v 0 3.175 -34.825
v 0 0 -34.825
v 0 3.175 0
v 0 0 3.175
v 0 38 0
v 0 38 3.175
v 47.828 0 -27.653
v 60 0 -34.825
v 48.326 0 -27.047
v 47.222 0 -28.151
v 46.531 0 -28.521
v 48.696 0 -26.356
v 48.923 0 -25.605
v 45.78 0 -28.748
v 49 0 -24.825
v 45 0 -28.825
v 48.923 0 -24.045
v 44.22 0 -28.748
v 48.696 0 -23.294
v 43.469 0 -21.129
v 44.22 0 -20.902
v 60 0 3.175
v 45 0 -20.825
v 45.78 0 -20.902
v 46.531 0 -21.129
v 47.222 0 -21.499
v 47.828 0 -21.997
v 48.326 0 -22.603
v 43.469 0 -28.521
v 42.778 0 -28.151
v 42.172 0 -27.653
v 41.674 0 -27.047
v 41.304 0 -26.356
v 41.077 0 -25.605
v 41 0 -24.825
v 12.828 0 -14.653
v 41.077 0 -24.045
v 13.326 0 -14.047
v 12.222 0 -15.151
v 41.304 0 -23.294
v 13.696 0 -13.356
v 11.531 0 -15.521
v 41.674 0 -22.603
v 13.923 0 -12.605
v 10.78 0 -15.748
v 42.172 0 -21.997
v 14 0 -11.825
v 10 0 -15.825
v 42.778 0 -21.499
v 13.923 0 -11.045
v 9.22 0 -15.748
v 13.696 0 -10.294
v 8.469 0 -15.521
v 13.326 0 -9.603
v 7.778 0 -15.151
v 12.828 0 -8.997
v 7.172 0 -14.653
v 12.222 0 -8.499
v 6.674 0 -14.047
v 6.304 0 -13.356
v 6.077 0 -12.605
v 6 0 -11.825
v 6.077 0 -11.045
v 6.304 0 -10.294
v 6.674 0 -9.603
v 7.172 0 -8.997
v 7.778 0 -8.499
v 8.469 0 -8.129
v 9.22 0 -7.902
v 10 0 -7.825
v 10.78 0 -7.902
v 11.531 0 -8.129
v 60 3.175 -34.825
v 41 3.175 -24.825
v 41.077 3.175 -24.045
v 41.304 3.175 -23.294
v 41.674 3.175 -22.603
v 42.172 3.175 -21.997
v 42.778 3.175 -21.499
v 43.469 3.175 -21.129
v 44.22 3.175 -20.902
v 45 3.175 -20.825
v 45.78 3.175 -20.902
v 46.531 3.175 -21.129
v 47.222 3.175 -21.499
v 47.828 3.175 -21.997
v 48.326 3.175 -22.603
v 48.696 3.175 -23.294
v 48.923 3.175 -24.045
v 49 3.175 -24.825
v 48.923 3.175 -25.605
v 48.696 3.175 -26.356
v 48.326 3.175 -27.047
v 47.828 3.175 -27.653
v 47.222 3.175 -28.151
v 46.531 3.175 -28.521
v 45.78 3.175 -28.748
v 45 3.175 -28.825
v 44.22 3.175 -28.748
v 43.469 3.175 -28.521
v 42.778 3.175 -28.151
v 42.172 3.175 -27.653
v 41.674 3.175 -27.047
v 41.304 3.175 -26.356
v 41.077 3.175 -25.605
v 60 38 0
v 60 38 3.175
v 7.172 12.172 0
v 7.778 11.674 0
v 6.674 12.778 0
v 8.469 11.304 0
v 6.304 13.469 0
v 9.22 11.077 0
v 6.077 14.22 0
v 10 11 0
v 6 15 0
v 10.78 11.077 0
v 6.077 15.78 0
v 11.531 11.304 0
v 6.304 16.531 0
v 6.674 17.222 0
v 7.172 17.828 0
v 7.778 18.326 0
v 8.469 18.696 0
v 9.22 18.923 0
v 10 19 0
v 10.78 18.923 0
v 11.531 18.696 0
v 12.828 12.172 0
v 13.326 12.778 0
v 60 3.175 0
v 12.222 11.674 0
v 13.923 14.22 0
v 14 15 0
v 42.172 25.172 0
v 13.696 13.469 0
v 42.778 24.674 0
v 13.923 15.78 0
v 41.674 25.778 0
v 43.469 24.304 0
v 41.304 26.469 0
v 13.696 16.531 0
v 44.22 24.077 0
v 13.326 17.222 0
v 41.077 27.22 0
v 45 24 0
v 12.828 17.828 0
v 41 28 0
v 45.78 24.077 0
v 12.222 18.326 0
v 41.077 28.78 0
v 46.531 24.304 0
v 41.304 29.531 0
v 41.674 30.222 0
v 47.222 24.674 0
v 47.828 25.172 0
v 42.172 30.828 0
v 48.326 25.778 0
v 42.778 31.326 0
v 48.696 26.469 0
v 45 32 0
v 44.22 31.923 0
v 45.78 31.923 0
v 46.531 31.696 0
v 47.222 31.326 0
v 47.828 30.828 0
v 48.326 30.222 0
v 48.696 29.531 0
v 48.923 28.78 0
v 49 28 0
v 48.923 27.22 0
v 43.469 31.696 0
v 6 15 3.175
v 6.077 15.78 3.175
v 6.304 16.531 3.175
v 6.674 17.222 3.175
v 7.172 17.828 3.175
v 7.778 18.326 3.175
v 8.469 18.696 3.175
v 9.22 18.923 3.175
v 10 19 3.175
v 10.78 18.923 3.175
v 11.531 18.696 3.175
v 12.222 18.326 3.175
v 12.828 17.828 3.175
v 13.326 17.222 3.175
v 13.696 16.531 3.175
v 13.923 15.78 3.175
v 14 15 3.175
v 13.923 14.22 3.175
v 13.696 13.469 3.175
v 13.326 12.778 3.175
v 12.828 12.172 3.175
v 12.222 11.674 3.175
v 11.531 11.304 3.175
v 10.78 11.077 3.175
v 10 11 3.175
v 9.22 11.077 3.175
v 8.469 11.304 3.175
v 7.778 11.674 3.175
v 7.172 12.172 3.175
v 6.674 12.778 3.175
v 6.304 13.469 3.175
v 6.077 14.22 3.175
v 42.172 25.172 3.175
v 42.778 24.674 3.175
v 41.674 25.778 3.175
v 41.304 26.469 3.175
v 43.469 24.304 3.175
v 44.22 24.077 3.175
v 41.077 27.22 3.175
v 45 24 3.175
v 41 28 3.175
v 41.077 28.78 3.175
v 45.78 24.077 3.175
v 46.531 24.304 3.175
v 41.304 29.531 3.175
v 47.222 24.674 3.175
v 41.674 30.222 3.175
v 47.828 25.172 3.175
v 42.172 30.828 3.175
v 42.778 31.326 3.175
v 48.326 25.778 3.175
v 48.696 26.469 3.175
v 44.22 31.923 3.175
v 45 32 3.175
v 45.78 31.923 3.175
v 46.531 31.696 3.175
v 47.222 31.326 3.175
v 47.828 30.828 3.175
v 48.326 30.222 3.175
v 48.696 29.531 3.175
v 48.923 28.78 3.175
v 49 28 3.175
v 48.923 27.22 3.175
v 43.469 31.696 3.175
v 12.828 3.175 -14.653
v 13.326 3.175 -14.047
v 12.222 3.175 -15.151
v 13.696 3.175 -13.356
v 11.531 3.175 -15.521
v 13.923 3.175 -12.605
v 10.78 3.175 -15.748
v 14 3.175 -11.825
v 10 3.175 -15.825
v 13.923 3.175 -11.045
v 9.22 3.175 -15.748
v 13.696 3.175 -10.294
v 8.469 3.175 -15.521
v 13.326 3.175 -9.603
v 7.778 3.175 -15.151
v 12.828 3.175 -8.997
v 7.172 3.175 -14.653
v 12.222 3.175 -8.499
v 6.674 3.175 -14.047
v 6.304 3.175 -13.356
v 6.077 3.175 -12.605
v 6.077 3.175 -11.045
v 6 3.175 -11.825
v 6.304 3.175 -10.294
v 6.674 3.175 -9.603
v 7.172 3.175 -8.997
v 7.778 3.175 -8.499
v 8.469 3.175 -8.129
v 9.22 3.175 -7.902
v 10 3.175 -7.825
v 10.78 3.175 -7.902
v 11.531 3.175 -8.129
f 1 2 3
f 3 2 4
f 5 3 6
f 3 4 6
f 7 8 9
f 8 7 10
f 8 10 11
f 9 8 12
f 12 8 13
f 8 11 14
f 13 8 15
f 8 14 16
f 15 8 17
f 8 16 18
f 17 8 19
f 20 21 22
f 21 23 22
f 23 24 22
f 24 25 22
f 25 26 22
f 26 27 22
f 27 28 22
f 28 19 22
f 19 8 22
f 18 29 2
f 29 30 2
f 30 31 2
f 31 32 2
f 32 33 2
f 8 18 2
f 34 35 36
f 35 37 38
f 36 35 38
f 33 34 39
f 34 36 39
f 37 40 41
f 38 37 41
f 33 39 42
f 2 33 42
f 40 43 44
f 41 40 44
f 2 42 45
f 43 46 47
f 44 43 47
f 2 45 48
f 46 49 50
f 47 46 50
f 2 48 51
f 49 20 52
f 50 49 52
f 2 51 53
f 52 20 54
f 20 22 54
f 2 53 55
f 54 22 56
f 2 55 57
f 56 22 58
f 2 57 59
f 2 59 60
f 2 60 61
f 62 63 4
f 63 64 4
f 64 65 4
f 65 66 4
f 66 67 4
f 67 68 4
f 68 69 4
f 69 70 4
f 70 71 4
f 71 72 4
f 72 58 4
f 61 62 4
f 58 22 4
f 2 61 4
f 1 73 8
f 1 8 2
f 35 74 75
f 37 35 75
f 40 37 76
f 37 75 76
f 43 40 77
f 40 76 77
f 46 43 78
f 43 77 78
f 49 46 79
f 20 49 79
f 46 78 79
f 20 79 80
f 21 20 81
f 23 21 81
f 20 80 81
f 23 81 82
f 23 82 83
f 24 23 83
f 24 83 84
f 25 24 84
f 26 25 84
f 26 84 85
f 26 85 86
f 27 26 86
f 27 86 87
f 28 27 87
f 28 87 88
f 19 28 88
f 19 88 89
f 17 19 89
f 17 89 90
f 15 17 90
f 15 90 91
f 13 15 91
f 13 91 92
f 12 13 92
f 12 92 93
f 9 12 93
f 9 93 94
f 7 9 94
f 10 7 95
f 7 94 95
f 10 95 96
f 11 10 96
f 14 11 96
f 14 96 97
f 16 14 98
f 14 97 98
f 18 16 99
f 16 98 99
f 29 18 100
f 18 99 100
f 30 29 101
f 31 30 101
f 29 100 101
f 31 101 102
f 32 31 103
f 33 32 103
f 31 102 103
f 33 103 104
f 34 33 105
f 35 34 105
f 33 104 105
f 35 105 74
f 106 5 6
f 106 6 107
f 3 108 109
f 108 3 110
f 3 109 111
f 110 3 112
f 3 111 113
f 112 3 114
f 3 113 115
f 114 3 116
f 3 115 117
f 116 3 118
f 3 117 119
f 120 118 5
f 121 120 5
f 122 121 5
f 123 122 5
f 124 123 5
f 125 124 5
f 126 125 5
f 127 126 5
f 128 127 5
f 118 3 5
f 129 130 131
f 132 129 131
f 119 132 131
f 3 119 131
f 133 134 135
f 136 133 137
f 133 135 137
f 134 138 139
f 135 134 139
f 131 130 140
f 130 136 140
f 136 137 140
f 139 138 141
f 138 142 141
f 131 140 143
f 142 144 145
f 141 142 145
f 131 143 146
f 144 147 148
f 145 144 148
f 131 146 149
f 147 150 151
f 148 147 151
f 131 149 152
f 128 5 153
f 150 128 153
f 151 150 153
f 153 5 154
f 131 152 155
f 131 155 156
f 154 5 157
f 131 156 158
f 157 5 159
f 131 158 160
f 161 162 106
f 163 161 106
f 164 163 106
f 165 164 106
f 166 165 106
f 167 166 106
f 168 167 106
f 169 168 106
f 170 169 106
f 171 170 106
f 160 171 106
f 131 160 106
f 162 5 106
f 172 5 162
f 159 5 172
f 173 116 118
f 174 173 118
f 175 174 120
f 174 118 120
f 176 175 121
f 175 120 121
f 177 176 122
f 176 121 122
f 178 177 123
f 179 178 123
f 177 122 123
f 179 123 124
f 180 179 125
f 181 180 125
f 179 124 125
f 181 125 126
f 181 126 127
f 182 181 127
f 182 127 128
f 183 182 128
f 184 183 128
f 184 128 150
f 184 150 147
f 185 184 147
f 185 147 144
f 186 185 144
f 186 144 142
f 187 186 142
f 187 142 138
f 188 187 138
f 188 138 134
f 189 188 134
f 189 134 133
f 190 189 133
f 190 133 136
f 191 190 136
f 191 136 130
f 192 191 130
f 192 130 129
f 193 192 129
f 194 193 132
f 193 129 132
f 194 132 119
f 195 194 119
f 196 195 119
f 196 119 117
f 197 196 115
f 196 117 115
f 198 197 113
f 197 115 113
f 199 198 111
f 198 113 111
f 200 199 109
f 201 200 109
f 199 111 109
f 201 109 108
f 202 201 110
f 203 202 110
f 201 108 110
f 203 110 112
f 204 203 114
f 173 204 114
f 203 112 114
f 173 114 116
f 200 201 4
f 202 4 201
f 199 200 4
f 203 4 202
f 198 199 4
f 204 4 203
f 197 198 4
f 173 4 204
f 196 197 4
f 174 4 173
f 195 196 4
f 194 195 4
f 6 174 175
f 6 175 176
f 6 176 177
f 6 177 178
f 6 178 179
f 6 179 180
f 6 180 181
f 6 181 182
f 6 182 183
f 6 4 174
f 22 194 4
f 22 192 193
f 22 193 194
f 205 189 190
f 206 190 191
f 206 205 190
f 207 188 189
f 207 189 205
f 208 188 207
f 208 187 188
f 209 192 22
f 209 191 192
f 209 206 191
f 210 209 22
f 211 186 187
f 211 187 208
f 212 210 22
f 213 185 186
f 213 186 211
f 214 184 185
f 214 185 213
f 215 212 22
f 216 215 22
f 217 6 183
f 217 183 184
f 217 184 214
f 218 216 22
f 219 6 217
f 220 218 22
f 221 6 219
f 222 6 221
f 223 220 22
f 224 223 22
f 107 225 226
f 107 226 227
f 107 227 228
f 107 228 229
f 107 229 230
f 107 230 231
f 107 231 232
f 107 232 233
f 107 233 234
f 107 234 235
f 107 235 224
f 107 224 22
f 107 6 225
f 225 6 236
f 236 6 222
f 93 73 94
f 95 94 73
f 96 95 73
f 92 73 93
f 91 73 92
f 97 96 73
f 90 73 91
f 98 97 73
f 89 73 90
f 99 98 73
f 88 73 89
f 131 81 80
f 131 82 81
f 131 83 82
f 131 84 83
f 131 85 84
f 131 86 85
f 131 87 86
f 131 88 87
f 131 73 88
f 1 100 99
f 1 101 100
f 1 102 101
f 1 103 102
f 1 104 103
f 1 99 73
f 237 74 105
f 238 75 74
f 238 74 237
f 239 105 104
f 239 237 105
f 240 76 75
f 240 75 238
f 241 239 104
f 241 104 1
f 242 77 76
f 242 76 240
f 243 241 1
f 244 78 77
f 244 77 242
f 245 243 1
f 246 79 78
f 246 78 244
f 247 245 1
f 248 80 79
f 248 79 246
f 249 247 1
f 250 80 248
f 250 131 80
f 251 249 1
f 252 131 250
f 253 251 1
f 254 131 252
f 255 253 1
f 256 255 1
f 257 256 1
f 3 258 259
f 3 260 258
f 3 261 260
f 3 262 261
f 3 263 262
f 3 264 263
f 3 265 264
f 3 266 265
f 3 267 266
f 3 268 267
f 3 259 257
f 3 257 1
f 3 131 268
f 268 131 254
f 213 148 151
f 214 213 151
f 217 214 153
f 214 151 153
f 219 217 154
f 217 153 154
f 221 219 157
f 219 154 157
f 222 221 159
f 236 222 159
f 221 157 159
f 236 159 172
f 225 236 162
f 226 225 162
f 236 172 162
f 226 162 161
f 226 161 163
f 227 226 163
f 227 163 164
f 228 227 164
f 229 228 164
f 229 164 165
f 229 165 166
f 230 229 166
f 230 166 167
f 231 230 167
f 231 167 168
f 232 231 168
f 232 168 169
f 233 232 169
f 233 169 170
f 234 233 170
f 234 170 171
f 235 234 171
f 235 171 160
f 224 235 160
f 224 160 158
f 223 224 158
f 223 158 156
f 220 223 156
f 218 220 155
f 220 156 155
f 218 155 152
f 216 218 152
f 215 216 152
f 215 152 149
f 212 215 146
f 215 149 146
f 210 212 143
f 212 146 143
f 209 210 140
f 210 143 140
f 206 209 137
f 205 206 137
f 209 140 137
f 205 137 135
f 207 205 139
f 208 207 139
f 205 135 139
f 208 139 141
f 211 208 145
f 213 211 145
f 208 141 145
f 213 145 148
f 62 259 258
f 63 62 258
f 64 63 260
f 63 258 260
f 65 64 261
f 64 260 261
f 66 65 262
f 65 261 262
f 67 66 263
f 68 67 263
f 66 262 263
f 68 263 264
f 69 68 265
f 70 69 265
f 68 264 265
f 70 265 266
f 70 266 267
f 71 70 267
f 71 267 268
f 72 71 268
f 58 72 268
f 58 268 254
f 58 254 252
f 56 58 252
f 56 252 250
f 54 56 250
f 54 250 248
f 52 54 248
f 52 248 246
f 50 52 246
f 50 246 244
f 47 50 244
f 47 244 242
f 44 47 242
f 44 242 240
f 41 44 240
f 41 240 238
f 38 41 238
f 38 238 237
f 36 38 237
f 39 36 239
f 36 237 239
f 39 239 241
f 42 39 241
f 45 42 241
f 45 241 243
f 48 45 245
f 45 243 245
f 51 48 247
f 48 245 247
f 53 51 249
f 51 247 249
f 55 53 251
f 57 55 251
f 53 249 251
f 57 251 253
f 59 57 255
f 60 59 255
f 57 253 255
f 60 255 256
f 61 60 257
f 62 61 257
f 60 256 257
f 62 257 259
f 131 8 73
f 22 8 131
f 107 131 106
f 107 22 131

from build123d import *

# Parameters (mm, degrees)
SKETCH1_W           = 60
SKETCH1_H           = 38
BOSS_EXTRUDE1_DEPTH = 3.175
SKETCH2_W           = 60
SKETCH2_H           = 3.175
BOSS_EXTRUDE2_DEPTH = 34.825
SKETCH3_R           = 4
CUT_EXTRUDE1_DEPTH  = 80.099814317
SKETCH4_R           = 4
CUT_EXTRUDE2_DEPTH  = 78.624488726


with BuildPart() as part:
    # Sketch1 → Boss-Extrude1 (new body)
    with BuildSketch(Plane.XY):
        with Locations((30, 19)):
            Rectangle(SKETCH1_W, SKETCH1_H)
    extrude(amount=BOSS_EXTRUDE1_DEPTH)

    # Sketch2 → Boss-Extrude2 (add)
    with BuildSketch(Plane(origin=(0, 0, 0), x_dir=(-1, 0, 0), z_dir=(0, 0, -1))):
        with Locations((-30, 1.5875)):
            Rectangle(SKETCH2_W, SKETCH2_H)
    extrude(amount=BOSS_EXTRUDE2_DEPTH)

    # Sketch3 → Cut-Extrude1 (cut, through all)
    with BuildSketch(Plane(origin=(0, 0, 0), x_dir=(-1, 0, 0), z_dir=(0, 0, -1))):
        with Locations((-45, 28)):
            Circle(SKETCH3_R)
        with Locations((-10, 15)):
            Circle(SKETCH3_R)
    extrude(amount=-CUT_EXTRUDE1_DEPTH, mode=Mode.SUBTRACT)

    # Sketch4 → Cut-Extrude2 (cut, through all)
    with BuildSketch(Plane(origin=(0, 3.175, 0), x_dir=(1, 0, 0), z_dir=(0, 1, 0))):
        with Locations(Location((45, 24.825, 0), (0, 0, 180))):
            Circle(SKETCH4_R)
        with Locations(Location((10, 11.825, 0), (0, 0, 180))):
            Circle(SKETCH4_R)
    extrude(amount=-CUT_EXTRUDE2_DEPTH, mode=Mode.SUBTRACT)


solid = part.part
